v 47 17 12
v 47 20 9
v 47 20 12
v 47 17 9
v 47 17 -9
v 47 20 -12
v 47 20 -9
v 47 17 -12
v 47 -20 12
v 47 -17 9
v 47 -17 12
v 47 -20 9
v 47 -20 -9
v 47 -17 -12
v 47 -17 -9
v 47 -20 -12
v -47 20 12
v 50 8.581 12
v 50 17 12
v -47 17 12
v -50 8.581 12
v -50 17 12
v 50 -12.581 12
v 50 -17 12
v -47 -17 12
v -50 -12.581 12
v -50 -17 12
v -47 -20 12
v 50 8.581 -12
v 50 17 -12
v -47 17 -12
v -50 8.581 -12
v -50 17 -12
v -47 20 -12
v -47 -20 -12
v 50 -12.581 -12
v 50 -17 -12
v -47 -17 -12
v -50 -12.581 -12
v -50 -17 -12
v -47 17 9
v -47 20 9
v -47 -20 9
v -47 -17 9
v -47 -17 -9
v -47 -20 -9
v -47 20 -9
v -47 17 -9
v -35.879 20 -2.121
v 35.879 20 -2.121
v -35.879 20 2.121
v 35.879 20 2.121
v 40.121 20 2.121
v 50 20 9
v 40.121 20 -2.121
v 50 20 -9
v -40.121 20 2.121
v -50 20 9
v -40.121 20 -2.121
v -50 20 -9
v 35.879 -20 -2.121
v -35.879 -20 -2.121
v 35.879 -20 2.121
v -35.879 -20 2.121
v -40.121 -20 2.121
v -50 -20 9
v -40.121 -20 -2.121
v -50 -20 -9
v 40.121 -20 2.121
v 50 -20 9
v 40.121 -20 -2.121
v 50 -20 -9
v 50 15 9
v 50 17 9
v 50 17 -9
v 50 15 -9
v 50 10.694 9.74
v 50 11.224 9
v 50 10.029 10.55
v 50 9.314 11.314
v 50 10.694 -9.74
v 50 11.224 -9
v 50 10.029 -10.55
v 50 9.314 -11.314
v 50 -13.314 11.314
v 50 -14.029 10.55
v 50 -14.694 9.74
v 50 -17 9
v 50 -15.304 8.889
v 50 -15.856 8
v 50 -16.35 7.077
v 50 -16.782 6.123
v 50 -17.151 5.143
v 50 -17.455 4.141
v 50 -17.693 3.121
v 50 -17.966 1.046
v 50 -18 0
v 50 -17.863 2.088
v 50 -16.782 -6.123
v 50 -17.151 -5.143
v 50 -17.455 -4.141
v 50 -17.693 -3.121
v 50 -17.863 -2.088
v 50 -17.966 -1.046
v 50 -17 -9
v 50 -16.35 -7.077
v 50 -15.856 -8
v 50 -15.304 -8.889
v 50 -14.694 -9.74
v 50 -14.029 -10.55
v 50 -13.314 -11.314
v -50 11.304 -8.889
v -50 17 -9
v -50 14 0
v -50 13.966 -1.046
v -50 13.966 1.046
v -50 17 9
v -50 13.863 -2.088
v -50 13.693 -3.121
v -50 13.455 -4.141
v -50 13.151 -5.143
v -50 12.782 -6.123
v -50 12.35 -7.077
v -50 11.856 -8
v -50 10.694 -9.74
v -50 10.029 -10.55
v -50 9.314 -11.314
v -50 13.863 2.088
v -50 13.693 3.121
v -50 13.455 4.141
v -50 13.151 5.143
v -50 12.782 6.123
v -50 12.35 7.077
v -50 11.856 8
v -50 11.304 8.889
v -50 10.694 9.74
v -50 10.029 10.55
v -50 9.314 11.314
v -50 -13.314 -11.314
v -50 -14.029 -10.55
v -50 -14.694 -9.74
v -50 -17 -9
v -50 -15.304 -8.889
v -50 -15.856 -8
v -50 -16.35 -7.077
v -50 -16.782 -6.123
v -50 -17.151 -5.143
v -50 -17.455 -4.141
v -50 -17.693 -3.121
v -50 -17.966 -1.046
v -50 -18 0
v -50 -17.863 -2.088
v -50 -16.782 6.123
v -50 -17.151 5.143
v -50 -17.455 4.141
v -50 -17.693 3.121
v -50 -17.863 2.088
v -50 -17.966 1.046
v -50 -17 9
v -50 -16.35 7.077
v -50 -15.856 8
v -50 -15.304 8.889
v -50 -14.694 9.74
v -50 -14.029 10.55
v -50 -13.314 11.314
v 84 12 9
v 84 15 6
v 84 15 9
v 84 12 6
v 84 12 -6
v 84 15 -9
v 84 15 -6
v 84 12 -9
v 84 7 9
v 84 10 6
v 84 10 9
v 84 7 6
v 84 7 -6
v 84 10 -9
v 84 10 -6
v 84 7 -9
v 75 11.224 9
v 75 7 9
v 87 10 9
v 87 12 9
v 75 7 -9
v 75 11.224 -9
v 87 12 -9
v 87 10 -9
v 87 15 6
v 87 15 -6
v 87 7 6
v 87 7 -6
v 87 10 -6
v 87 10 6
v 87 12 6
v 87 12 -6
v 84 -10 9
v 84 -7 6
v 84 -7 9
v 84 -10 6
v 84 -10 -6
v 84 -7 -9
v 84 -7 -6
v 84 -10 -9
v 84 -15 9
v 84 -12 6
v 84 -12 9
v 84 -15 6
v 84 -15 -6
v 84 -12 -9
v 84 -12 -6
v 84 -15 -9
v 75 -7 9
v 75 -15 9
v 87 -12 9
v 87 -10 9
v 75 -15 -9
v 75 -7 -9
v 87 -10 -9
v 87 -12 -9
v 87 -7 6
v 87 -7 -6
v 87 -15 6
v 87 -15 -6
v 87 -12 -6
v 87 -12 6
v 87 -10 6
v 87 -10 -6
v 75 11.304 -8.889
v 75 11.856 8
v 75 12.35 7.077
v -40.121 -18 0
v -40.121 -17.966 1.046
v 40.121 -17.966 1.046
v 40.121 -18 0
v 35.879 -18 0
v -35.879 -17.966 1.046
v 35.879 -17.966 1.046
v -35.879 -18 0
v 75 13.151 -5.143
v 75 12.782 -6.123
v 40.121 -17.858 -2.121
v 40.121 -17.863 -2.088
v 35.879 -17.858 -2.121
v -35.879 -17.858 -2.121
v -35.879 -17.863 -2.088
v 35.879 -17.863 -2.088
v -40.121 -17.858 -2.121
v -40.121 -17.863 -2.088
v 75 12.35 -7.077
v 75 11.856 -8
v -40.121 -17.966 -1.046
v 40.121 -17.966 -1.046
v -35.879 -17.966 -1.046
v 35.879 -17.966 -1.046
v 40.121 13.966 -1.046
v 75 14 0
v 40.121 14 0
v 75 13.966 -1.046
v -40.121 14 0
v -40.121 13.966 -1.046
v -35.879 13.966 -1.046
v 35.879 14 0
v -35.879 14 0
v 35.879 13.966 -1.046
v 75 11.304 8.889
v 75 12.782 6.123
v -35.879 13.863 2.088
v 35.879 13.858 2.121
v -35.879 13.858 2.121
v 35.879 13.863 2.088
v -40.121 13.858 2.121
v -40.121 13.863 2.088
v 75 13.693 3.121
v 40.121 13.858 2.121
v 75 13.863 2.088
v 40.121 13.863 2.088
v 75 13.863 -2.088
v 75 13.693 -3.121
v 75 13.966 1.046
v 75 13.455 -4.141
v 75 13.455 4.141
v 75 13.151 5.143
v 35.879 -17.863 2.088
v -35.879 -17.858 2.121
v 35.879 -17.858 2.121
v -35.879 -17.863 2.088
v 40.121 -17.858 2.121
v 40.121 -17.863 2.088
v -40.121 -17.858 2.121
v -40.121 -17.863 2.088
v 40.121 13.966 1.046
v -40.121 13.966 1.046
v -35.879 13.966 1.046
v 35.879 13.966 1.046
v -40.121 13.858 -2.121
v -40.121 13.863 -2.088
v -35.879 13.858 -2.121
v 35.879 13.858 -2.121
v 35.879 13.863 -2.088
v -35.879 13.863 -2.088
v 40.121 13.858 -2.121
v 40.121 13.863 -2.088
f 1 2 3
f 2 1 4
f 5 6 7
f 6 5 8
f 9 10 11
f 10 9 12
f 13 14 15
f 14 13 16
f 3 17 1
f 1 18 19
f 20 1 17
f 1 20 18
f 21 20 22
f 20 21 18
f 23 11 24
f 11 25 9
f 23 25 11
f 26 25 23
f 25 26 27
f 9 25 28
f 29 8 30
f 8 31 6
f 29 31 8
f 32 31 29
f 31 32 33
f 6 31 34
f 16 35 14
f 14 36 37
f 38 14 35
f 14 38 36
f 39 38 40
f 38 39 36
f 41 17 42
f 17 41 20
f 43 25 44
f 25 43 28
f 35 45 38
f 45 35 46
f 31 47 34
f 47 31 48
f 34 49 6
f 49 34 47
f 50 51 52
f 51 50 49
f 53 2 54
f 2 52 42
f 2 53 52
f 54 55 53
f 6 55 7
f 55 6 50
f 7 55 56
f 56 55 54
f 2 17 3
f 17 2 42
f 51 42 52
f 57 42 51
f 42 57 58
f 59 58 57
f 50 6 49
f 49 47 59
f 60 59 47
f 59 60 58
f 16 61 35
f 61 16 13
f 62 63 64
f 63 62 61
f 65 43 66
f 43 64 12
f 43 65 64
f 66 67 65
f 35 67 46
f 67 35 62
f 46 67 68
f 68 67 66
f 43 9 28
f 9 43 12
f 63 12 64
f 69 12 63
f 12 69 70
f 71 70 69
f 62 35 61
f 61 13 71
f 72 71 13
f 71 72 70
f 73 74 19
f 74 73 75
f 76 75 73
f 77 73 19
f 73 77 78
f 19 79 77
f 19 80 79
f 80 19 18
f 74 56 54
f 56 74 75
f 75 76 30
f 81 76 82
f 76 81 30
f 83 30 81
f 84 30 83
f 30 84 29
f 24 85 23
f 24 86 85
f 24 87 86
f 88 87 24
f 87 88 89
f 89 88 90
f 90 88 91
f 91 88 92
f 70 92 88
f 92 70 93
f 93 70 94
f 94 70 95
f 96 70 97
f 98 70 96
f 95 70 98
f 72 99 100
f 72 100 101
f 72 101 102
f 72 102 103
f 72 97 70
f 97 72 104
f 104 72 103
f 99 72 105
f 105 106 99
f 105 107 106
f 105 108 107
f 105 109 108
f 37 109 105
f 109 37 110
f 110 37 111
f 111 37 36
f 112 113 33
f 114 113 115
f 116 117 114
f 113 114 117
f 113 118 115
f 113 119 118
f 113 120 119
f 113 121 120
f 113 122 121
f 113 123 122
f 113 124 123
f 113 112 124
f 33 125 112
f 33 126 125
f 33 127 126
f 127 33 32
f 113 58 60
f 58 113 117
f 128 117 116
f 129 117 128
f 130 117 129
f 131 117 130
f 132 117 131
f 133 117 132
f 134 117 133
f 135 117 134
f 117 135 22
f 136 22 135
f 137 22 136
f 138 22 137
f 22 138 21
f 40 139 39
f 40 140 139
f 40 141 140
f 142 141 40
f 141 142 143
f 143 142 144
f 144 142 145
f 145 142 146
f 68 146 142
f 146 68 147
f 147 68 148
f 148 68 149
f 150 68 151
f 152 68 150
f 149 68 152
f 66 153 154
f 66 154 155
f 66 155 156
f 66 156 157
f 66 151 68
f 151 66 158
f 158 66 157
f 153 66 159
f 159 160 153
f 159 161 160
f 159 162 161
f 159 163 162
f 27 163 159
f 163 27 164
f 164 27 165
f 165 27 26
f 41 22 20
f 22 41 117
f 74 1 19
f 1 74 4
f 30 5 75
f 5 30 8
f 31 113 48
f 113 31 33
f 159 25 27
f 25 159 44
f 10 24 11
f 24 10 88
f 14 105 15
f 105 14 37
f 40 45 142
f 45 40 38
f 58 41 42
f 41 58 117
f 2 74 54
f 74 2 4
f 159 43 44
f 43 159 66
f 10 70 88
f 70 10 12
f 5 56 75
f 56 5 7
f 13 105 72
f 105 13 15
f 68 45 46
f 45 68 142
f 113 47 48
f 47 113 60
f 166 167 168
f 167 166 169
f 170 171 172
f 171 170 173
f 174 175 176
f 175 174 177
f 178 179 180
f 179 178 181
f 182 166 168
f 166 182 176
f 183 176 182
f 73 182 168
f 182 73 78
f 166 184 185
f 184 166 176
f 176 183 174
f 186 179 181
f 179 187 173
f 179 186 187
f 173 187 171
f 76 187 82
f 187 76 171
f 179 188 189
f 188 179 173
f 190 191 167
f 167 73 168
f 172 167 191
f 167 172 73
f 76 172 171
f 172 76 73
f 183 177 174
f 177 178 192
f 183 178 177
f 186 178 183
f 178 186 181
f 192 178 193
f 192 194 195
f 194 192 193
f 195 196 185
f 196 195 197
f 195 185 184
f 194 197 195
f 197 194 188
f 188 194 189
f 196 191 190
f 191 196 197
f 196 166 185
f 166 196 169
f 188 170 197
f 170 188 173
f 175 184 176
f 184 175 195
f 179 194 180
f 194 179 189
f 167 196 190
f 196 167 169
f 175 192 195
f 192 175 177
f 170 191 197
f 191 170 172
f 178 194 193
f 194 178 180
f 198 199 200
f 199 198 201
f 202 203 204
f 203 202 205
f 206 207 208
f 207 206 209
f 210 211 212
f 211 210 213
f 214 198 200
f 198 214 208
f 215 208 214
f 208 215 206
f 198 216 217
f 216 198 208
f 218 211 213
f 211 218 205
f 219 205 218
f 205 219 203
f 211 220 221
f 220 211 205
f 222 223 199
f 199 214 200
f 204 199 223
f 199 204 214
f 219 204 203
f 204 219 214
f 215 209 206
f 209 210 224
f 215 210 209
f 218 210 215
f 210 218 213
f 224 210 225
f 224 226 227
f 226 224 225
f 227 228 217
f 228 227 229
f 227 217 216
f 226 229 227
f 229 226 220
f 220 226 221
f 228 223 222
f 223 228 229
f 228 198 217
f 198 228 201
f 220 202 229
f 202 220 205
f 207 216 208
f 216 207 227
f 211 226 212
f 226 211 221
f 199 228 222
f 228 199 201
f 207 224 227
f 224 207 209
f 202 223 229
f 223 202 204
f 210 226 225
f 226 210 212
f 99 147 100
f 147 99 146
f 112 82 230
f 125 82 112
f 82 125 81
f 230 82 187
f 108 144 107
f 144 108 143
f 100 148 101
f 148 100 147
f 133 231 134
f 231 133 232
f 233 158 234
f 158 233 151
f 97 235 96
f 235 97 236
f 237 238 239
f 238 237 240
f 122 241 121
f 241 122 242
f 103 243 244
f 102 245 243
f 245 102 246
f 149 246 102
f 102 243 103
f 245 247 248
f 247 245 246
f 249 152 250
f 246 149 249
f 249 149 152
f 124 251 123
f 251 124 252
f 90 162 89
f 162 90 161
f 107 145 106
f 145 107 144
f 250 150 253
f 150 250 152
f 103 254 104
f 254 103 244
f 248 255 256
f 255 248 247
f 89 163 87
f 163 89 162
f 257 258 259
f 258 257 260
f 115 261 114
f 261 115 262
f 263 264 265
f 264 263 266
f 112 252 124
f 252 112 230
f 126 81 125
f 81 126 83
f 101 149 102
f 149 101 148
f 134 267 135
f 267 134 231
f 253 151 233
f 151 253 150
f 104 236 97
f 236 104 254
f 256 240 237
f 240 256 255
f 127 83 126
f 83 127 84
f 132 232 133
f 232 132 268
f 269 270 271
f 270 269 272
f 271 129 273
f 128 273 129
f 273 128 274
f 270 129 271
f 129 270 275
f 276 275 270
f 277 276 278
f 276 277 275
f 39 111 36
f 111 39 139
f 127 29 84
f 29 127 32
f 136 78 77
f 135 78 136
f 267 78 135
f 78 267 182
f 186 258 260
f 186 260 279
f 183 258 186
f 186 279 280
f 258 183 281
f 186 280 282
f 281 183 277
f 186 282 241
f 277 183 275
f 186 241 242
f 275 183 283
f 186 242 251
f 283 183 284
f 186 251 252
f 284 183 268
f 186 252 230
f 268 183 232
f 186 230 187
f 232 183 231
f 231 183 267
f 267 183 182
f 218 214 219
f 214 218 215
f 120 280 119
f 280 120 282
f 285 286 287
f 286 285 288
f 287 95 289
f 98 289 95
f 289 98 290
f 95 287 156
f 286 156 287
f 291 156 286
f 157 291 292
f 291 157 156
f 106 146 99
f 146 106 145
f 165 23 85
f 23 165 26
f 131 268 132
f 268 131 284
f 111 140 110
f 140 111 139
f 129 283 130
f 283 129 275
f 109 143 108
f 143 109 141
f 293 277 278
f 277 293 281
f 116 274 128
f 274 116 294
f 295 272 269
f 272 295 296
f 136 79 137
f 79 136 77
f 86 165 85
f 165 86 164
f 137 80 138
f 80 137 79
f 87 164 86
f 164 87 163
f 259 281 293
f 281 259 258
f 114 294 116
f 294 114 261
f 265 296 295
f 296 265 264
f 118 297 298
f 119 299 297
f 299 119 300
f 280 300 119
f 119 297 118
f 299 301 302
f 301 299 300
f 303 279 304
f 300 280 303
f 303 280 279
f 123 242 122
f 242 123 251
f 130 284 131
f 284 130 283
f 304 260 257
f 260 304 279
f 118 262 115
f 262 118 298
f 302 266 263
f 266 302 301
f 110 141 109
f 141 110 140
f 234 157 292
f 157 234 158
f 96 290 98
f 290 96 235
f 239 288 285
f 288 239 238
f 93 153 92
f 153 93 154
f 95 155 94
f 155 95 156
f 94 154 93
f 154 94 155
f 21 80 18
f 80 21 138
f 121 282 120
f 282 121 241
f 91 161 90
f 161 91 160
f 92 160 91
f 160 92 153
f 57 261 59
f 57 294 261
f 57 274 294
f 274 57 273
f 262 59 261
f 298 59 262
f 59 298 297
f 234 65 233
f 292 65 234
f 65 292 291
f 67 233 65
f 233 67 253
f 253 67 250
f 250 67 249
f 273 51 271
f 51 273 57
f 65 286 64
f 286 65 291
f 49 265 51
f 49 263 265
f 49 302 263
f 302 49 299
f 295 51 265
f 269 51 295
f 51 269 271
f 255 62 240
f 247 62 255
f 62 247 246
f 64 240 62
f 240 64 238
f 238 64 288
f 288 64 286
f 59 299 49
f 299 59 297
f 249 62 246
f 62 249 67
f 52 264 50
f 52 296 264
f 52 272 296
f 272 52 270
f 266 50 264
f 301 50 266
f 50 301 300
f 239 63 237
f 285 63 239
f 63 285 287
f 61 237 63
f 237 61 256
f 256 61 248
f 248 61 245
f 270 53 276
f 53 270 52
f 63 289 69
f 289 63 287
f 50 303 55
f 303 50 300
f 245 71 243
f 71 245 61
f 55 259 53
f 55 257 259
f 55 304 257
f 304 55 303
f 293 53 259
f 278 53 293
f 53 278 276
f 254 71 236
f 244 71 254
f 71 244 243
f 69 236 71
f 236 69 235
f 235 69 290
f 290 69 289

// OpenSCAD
$fn=96;

L = 100;
W = 40;
H = 24;

cut_r = 16;
cut_z = 0;

prong_len = 40;
prong_gap = 14;
prong_thk = 8;
prong_h = 18;

hole_d = 6;
hole_offset = 38;

chamfer = 3;

module chamfered_box(size=[10,10,10], c=2){
    sx=size[0]; sy=size[1]; sz=size[2];
    intersection(){
        cube([sx,sy,sz], center=true);
        union(){
            cube([sx-2*c, sy, sz], center=true);
            cube([sx, sy-2*c, sz], center=true);
            cube([sx, sy, sz-2*c], center=true);
            rotate([0,0,45]) cube([sx*1.2, sy-2*c, sz-2*c], center=true);
            rotate([0,0,45]) cube([sx-2*c, sy*1.2, sz-2*c], center=true);
            rotate([0,0,45]) cube([sx-2*c, sy-2*c, sz*1.2], center=true);
        }
    }
}

module prong(xc, yc){
    translate([xc, yc, 0])
        chamfered_box([prong_len, prong_thk, prong_h], c=chamfer);
}

module body(){
    union(){
        chamfered_box([L, W, H], c=chamfer);

        // Two prongs extending from +X side
        prong(L/2 + prong_len/2 - chamfer,  (prong_gap/2 + prong_thk/2));
        prong(L/2 + prong_len/2 - chamfer, -(prong_gap/2 + prong_thk/2));
    }
}

module internal_cutout(){
    // Large semicircular internal cutout (cylindrical along X), open to -Y side
    translate([0, -W/2 + cut_r + 2, cut_z])
        rotate([0,90,0])
            cylinder(h=L + prong_len + 10, r=cut_r, center=true);
}

module fork_opening(){
    // Remove material between prongs to create fork opening
    translate([L/2 + prong_len/2 - chamfer, 0, 0])
        cube([prong_len + 2, prong_gap, prong_h + 2], center=true);
}

module end_hole(xpos){
    // Through-hole along Y, appears diamond-shaped when viewed at angle by rotating square profile
    translate([xpos, 0, 0])
        rotate([90,0,0])
            rotate([0,0,45])
                cylinder(h=W + 20, r=hole_d/2, center=true, $fn=4);
}

difference(){
    body();
    internal_cutout();
    fork_opening();
    end_hole(-hole_offset);
    end_hole( hole_offset);
}
